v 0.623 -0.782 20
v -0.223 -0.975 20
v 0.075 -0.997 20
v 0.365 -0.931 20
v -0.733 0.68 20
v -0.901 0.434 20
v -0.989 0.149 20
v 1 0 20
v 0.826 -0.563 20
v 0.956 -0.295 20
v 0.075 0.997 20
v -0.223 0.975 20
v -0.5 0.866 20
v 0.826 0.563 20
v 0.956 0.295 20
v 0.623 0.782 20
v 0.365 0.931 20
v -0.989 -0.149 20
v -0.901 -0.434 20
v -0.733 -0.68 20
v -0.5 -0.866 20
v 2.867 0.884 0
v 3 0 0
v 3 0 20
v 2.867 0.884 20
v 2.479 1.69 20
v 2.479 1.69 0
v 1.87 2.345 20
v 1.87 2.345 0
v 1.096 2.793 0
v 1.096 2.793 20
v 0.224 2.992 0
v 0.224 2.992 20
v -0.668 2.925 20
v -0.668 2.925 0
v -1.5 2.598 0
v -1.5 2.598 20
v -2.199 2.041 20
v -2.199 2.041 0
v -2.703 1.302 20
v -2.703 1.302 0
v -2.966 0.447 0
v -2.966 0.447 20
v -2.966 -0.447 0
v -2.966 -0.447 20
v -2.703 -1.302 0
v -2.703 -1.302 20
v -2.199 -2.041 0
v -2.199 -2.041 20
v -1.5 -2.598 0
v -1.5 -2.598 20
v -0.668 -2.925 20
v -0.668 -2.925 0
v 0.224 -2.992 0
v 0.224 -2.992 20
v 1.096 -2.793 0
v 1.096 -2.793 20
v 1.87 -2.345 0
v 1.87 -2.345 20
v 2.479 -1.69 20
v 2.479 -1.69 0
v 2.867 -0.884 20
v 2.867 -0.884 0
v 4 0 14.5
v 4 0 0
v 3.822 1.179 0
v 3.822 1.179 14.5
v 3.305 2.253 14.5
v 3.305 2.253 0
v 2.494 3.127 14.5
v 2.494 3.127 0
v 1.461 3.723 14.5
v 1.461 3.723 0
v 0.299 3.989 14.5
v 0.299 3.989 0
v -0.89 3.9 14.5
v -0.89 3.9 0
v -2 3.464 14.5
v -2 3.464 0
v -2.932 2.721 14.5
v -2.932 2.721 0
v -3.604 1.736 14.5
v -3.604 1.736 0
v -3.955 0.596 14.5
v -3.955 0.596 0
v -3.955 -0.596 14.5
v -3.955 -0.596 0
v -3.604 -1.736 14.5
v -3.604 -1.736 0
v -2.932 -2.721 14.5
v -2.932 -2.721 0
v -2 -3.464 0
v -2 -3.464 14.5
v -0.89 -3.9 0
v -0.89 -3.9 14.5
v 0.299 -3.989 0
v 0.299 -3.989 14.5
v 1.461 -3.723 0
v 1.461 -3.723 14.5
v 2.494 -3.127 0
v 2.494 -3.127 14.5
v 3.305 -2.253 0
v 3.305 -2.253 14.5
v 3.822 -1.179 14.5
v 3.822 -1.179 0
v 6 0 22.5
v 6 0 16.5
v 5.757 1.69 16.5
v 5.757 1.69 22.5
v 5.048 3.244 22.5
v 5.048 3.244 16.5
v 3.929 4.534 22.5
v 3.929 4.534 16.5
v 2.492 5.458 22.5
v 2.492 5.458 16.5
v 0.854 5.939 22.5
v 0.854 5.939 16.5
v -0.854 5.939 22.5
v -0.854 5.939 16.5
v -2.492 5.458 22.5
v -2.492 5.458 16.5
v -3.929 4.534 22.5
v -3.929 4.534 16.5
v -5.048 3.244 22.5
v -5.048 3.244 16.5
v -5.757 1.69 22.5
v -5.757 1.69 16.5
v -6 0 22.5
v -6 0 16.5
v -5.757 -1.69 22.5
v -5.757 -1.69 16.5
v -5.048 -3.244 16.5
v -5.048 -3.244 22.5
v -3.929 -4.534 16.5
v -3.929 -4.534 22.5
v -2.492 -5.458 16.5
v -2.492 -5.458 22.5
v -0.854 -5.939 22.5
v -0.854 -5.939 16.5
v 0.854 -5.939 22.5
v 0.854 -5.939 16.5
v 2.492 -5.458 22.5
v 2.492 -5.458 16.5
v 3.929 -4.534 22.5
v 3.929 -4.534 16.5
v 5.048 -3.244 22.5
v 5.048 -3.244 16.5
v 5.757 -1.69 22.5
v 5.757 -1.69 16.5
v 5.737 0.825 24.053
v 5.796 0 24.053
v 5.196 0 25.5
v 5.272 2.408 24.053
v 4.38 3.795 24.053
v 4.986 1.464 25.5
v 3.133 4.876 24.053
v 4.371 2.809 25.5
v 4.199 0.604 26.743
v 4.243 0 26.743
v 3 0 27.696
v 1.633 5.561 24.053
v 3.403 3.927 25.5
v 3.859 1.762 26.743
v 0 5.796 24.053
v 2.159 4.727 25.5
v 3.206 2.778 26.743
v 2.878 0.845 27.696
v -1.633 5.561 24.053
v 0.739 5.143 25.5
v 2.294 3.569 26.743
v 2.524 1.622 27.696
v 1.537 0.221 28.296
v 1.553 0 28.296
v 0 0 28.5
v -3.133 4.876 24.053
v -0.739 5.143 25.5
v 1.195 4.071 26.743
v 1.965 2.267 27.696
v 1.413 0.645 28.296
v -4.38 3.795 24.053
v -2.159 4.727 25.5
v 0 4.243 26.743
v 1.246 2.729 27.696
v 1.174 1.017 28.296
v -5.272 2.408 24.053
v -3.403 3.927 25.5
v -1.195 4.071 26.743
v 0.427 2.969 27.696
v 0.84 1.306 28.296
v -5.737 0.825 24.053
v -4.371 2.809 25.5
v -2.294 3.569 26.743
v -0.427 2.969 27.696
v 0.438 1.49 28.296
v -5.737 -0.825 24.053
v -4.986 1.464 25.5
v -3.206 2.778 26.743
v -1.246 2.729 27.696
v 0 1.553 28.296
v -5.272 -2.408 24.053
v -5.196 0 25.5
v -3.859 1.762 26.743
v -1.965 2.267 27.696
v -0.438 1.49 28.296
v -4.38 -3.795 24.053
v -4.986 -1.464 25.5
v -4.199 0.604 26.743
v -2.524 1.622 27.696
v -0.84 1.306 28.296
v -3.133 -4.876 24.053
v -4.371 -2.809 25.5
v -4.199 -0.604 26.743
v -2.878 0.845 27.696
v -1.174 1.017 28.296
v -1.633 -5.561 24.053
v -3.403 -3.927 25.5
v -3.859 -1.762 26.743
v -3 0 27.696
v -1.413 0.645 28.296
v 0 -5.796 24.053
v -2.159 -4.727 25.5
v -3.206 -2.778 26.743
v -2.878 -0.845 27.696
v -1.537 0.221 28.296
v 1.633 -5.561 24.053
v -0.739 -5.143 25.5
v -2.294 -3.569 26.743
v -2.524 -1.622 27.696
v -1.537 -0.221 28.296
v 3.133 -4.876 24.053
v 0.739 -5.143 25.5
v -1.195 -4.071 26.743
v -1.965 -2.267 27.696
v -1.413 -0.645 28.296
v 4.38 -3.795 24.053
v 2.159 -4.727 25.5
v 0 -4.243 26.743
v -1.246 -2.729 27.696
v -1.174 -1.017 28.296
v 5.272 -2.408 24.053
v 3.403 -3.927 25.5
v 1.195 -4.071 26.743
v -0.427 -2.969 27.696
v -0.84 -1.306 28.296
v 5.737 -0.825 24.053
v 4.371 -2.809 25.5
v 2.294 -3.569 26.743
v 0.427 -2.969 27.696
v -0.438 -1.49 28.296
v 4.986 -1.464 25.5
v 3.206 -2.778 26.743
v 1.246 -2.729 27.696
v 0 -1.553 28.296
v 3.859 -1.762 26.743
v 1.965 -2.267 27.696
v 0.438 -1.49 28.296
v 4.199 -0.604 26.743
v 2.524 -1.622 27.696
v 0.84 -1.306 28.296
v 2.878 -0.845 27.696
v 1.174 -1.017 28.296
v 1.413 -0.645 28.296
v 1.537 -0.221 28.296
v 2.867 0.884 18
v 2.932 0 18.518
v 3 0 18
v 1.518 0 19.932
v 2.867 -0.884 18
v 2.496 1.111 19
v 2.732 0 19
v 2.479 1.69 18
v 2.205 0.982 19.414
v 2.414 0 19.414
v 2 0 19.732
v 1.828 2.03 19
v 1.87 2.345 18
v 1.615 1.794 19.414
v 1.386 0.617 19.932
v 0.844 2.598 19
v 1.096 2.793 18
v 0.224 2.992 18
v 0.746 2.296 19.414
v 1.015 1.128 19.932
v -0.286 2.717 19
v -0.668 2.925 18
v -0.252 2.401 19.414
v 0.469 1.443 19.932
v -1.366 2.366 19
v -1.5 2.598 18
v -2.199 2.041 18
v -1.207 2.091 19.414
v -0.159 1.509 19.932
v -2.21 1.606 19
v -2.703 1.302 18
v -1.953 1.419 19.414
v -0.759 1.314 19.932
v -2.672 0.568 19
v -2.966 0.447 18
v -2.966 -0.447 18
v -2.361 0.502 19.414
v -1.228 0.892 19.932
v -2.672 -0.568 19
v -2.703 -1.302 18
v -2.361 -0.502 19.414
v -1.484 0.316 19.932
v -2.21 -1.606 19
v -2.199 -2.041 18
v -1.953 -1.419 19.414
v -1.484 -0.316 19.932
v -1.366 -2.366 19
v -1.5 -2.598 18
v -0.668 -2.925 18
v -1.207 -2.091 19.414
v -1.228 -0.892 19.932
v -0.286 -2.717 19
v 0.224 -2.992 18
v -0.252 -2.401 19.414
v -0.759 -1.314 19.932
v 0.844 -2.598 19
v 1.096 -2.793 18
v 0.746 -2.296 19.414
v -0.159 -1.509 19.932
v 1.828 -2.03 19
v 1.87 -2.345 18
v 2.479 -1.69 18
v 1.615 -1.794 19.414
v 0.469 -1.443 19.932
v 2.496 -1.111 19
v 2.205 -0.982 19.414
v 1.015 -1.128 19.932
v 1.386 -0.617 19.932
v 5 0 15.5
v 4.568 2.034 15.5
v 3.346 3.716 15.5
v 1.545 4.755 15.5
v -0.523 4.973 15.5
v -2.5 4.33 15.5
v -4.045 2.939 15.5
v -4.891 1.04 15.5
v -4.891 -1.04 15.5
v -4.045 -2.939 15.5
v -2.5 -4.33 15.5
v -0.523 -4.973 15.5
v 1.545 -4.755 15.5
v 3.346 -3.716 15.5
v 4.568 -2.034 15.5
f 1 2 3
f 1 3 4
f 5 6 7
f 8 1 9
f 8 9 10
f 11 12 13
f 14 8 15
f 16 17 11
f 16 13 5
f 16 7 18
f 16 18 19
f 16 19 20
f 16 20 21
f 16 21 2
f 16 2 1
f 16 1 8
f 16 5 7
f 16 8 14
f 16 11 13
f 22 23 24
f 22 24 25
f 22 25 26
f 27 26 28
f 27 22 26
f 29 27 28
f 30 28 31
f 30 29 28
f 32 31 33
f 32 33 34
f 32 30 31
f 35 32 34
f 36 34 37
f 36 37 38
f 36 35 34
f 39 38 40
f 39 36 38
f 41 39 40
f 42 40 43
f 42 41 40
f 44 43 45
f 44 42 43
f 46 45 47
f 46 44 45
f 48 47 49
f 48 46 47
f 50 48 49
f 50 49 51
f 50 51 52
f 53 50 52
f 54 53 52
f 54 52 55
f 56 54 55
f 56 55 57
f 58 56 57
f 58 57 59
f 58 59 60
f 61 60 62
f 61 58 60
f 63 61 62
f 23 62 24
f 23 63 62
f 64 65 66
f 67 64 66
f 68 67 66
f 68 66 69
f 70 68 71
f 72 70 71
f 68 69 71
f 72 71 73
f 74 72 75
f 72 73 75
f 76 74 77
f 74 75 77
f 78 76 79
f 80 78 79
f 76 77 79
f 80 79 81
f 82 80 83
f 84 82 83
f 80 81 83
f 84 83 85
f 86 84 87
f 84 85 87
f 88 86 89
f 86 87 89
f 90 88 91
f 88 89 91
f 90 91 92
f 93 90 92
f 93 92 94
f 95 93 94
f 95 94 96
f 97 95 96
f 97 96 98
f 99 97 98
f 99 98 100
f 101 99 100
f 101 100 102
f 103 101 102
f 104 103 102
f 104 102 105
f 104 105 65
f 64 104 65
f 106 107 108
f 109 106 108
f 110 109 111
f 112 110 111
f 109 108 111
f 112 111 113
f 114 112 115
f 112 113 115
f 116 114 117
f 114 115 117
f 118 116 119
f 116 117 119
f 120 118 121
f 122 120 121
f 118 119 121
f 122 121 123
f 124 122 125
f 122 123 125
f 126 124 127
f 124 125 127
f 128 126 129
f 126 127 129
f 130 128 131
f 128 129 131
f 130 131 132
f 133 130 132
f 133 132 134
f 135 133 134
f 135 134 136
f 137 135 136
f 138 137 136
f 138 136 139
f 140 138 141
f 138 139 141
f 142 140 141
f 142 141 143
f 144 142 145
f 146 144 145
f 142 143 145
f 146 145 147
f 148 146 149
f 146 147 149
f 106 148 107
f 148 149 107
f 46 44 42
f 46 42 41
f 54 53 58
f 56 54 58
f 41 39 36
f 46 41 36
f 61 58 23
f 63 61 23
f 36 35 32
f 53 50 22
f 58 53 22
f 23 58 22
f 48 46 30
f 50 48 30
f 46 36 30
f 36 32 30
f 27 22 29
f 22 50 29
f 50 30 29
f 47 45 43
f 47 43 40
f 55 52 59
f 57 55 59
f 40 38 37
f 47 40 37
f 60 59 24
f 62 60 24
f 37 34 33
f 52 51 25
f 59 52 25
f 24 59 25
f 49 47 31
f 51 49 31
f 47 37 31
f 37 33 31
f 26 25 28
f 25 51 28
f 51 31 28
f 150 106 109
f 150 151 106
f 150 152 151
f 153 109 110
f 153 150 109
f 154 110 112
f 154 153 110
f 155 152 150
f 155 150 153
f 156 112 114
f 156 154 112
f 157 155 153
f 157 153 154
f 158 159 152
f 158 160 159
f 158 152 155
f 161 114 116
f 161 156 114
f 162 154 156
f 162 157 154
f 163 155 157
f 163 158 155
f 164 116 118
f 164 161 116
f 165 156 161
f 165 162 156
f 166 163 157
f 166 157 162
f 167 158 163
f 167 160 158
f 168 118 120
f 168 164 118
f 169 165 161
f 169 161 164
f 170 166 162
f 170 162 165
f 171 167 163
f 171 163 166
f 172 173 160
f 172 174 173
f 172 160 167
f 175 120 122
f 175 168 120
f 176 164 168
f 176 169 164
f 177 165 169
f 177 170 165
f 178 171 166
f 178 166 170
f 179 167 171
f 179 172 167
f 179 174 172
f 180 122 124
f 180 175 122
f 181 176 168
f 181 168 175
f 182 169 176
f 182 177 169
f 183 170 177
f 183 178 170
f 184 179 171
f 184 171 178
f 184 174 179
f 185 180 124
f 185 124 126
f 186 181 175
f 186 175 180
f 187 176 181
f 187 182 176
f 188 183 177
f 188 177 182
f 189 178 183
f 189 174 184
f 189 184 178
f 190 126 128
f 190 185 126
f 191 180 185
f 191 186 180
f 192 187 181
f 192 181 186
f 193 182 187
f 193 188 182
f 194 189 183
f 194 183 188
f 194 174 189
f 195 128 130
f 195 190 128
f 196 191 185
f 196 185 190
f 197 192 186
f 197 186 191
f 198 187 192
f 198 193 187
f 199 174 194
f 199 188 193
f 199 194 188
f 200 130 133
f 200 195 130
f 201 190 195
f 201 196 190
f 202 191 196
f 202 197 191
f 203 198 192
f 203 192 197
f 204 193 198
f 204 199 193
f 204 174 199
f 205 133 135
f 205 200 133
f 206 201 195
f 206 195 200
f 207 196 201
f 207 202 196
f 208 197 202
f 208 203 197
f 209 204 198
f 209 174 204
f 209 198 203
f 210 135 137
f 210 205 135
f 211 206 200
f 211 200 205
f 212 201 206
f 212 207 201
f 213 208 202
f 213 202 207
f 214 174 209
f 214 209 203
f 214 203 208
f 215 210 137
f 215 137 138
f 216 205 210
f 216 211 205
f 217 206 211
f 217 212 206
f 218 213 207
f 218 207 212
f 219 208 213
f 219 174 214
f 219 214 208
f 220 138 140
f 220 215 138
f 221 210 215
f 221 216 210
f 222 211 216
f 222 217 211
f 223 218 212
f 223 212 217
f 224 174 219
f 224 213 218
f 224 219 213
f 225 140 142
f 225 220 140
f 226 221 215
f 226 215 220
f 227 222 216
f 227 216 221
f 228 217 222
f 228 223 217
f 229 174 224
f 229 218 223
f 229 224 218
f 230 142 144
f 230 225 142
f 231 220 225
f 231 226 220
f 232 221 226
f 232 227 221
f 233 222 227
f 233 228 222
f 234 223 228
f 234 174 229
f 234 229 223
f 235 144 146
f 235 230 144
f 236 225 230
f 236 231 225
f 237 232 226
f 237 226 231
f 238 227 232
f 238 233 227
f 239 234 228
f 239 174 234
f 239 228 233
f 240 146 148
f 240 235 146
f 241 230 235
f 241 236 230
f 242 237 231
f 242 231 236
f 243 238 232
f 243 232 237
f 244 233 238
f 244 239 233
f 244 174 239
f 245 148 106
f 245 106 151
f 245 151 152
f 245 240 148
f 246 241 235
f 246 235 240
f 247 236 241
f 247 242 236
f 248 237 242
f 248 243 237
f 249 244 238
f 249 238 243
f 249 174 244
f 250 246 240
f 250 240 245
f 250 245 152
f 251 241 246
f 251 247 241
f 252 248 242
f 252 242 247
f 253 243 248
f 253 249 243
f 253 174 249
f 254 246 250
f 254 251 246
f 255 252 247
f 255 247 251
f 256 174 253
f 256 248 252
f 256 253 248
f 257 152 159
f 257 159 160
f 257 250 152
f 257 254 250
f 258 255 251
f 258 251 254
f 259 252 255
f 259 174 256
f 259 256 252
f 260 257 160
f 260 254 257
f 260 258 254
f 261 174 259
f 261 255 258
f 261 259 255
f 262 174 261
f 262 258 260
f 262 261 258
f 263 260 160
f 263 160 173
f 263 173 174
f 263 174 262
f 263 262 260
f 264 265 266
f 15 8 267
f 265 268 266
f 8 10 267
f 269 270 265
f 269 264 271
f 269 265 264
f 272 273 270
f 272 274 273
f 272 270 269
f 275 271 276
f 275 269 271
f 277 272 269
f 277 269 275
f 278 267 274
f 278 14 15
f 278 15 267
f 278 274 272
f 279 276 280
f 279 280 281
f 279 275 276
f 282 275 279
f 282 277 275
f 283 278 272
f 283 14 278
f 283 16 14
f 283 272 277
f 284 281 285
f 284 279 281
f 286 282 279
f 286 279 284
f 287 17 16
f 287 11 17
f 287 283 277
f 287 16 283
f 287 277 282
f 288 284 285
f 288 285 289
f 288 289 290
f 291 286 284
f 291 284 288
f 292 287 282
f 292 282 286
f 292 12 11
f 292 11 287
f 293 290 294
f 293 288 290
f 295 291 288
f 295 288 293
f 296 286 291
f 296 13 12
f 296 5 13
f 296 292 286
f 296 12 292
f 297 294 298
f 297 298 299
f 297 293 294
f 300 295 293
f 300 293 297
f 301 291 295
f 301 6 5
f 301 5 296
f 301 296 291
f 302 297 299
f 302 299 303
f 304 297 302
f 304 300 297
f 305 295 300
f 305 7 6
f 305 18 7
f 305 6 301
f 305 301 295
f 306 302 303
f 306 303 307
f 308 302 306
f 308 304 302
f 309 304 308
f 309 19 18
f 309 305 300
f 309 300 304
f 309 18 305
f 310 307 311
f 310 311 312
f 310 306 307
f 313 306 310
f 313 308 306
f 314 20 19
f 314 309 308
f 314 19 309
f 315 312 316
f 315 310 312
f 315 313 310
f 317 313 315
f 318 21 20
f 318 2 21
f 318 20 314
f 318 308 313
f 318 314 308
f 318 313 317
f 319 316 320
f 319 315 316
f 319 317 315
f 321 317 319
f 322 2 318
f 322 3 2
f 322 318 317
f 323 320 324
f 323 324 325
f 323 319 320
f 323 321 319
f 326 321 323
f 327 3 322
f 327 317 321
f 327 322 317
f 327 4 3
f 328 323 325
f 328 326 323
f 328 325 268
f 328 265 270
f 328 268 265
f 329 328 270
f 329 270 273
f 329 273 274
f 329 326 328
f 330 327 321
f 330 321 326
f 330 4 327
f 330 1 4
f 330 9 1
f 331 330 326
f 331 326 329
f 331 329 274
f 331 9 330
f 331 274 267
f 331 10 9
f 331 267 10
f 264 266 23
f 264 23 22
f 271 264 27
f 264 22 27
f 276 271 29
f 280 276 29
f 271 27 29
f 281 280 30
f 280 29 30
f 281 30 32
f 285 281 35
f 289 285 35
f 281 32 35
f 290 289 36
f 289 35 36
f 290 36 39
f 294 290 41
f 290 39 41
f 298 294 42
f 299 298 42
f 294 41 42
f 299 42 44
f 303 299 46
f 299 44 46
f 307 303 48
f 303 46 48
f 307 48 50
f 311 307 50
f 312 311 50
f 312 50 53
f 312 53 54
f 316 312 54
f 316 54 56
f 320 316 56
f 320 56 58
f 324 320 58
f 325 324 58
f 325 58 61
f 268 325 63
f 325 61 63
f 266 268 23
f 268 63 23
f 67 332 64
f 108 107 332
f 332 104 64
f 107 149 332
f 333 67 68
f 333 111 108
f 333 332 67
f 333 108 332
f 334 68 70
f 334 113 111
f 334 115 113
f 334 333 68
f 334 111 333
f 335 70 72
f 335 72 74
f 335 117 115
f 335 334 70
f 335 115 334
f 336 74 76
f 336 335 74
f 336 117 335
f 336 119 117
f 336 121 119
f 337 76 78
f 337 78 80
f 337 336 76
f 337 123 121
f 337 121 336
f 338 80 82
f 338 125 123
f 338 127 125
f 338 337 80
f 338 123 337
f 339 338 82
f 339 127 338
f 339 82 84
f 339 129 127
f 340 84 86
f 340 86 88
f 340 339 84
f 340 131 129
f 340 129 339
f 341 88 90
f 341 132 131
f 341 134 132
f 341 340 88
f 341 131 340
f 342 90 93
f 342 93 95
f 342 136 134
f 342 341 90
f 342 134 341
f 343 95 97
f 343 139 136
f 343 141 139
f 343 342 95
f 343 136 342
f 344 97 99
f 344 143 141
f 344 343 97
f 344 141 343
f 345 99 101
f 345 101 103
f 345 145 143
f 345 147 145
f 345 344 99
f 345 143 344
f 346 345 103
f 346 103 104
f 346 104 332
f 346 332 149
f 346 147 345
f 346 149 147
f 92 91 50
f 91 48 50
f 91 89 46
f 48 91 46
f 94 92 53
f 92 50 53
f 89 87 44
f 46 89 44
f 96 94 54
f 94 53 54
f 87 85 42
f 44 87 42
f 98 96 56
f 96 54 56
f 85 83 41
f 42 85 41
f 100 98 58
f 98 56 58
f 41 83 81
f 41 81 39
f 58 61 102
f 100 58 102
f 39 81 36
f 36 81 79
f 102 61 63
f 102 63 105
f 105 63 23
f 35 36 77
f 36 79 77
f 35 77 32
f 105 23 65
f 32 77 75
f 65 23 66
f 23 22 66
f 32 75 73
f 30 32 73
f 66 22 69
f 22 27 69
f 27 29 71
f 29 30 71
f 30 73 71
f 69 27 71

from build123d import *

# Parameters (mm, degrees)
CYLINDER_R        = 3
CYLINDER_DEPTH    = 20
CYLINDER002_R     = 6
CYLINDER002_DEPTH = 6
CYLINDER003_R     = 4
CYLINDER003_DEPTH = 15
CYLINDER005_R     = 3
CYLINDER005_DEPTH = 20
FILLET001_R       = 2


with BuildPart() as cylinder:
    # Cylinder → Cylinder (new body)
    with BuildSketch(Plane.XY):
        Circle(CYLINDER_R)
    extrude(amount=CYLINDER_DEPTH)


with BuildPart() as cone:
    # Cone → Cone (revolve)
    with BuildSketch(Plane(origin=(0, 0, 14.5), x_dir=(1, 0, 0), z_dir=(0, -1, 0))):
        Polygon((0, 0), (4, 0), (6, 2), (0, 2), align=None)
    revolve(axis=Axis((0, 0, 14.5), (0, 0, 1)))


with BuildPart() as cylinder002:
    # Cylinder002 → Cylinder002 (new body)
    with BuildSketch(Plane.XY.offset(16.5)):
        Circle(CYLINDER002_R)
    extrude(amount=CYLINDER002_DEPTH)


with BuildPart() as sphere:
    # Sphere → Sphere (revolve)
    with BuildSketch(Plane(origin=(0, 0, 22.5), x_dir=(1, 0, 0), z_dir=(0, -1, 0))):
        with BuildLine():
            ThreePointArc((0, -6), (6, 0), (0, 6))
            Line((0, 6), (0, -6))
        make_face()
    revolve(axis=Axis((0, 0, 22.5), (0, 0, 1)))


with BuildPart() as cut:
    # Cylinder003 → Cylinder003 (new body)
    with BuildSketch(Plane.XY):
        Circle(CYLINDER003_R)
    extrude(amount=CYLINDER003_DEPTH)

    # Fusion: union Cone, Cylinder002, Sphere
    add(cone.part)
    add(cylinder002.part)
    add(sphere.part)

    # Cut: cut Cylinder
    add(cylinder.part, mode=Mode.SUBTRACT)


with BuildPart() as fillet001:
    # Cylinder005 → Cylinder005 (new body)
    with BuildSketch(Plane.XY):
        Circle(CYLINDER005_R)
    extrude(amount=CYLINDER005_DEPTH)

    # Fillet001
    fillet001_edges = [fillet001.edges().sort_by_distance(p)[0] for p in [
        (-3, 0, 20),
    ]]
    fillet(fillet001_edges, radius=FILLET001_R)


solid = Compound([cut.part, fillet001.part])
